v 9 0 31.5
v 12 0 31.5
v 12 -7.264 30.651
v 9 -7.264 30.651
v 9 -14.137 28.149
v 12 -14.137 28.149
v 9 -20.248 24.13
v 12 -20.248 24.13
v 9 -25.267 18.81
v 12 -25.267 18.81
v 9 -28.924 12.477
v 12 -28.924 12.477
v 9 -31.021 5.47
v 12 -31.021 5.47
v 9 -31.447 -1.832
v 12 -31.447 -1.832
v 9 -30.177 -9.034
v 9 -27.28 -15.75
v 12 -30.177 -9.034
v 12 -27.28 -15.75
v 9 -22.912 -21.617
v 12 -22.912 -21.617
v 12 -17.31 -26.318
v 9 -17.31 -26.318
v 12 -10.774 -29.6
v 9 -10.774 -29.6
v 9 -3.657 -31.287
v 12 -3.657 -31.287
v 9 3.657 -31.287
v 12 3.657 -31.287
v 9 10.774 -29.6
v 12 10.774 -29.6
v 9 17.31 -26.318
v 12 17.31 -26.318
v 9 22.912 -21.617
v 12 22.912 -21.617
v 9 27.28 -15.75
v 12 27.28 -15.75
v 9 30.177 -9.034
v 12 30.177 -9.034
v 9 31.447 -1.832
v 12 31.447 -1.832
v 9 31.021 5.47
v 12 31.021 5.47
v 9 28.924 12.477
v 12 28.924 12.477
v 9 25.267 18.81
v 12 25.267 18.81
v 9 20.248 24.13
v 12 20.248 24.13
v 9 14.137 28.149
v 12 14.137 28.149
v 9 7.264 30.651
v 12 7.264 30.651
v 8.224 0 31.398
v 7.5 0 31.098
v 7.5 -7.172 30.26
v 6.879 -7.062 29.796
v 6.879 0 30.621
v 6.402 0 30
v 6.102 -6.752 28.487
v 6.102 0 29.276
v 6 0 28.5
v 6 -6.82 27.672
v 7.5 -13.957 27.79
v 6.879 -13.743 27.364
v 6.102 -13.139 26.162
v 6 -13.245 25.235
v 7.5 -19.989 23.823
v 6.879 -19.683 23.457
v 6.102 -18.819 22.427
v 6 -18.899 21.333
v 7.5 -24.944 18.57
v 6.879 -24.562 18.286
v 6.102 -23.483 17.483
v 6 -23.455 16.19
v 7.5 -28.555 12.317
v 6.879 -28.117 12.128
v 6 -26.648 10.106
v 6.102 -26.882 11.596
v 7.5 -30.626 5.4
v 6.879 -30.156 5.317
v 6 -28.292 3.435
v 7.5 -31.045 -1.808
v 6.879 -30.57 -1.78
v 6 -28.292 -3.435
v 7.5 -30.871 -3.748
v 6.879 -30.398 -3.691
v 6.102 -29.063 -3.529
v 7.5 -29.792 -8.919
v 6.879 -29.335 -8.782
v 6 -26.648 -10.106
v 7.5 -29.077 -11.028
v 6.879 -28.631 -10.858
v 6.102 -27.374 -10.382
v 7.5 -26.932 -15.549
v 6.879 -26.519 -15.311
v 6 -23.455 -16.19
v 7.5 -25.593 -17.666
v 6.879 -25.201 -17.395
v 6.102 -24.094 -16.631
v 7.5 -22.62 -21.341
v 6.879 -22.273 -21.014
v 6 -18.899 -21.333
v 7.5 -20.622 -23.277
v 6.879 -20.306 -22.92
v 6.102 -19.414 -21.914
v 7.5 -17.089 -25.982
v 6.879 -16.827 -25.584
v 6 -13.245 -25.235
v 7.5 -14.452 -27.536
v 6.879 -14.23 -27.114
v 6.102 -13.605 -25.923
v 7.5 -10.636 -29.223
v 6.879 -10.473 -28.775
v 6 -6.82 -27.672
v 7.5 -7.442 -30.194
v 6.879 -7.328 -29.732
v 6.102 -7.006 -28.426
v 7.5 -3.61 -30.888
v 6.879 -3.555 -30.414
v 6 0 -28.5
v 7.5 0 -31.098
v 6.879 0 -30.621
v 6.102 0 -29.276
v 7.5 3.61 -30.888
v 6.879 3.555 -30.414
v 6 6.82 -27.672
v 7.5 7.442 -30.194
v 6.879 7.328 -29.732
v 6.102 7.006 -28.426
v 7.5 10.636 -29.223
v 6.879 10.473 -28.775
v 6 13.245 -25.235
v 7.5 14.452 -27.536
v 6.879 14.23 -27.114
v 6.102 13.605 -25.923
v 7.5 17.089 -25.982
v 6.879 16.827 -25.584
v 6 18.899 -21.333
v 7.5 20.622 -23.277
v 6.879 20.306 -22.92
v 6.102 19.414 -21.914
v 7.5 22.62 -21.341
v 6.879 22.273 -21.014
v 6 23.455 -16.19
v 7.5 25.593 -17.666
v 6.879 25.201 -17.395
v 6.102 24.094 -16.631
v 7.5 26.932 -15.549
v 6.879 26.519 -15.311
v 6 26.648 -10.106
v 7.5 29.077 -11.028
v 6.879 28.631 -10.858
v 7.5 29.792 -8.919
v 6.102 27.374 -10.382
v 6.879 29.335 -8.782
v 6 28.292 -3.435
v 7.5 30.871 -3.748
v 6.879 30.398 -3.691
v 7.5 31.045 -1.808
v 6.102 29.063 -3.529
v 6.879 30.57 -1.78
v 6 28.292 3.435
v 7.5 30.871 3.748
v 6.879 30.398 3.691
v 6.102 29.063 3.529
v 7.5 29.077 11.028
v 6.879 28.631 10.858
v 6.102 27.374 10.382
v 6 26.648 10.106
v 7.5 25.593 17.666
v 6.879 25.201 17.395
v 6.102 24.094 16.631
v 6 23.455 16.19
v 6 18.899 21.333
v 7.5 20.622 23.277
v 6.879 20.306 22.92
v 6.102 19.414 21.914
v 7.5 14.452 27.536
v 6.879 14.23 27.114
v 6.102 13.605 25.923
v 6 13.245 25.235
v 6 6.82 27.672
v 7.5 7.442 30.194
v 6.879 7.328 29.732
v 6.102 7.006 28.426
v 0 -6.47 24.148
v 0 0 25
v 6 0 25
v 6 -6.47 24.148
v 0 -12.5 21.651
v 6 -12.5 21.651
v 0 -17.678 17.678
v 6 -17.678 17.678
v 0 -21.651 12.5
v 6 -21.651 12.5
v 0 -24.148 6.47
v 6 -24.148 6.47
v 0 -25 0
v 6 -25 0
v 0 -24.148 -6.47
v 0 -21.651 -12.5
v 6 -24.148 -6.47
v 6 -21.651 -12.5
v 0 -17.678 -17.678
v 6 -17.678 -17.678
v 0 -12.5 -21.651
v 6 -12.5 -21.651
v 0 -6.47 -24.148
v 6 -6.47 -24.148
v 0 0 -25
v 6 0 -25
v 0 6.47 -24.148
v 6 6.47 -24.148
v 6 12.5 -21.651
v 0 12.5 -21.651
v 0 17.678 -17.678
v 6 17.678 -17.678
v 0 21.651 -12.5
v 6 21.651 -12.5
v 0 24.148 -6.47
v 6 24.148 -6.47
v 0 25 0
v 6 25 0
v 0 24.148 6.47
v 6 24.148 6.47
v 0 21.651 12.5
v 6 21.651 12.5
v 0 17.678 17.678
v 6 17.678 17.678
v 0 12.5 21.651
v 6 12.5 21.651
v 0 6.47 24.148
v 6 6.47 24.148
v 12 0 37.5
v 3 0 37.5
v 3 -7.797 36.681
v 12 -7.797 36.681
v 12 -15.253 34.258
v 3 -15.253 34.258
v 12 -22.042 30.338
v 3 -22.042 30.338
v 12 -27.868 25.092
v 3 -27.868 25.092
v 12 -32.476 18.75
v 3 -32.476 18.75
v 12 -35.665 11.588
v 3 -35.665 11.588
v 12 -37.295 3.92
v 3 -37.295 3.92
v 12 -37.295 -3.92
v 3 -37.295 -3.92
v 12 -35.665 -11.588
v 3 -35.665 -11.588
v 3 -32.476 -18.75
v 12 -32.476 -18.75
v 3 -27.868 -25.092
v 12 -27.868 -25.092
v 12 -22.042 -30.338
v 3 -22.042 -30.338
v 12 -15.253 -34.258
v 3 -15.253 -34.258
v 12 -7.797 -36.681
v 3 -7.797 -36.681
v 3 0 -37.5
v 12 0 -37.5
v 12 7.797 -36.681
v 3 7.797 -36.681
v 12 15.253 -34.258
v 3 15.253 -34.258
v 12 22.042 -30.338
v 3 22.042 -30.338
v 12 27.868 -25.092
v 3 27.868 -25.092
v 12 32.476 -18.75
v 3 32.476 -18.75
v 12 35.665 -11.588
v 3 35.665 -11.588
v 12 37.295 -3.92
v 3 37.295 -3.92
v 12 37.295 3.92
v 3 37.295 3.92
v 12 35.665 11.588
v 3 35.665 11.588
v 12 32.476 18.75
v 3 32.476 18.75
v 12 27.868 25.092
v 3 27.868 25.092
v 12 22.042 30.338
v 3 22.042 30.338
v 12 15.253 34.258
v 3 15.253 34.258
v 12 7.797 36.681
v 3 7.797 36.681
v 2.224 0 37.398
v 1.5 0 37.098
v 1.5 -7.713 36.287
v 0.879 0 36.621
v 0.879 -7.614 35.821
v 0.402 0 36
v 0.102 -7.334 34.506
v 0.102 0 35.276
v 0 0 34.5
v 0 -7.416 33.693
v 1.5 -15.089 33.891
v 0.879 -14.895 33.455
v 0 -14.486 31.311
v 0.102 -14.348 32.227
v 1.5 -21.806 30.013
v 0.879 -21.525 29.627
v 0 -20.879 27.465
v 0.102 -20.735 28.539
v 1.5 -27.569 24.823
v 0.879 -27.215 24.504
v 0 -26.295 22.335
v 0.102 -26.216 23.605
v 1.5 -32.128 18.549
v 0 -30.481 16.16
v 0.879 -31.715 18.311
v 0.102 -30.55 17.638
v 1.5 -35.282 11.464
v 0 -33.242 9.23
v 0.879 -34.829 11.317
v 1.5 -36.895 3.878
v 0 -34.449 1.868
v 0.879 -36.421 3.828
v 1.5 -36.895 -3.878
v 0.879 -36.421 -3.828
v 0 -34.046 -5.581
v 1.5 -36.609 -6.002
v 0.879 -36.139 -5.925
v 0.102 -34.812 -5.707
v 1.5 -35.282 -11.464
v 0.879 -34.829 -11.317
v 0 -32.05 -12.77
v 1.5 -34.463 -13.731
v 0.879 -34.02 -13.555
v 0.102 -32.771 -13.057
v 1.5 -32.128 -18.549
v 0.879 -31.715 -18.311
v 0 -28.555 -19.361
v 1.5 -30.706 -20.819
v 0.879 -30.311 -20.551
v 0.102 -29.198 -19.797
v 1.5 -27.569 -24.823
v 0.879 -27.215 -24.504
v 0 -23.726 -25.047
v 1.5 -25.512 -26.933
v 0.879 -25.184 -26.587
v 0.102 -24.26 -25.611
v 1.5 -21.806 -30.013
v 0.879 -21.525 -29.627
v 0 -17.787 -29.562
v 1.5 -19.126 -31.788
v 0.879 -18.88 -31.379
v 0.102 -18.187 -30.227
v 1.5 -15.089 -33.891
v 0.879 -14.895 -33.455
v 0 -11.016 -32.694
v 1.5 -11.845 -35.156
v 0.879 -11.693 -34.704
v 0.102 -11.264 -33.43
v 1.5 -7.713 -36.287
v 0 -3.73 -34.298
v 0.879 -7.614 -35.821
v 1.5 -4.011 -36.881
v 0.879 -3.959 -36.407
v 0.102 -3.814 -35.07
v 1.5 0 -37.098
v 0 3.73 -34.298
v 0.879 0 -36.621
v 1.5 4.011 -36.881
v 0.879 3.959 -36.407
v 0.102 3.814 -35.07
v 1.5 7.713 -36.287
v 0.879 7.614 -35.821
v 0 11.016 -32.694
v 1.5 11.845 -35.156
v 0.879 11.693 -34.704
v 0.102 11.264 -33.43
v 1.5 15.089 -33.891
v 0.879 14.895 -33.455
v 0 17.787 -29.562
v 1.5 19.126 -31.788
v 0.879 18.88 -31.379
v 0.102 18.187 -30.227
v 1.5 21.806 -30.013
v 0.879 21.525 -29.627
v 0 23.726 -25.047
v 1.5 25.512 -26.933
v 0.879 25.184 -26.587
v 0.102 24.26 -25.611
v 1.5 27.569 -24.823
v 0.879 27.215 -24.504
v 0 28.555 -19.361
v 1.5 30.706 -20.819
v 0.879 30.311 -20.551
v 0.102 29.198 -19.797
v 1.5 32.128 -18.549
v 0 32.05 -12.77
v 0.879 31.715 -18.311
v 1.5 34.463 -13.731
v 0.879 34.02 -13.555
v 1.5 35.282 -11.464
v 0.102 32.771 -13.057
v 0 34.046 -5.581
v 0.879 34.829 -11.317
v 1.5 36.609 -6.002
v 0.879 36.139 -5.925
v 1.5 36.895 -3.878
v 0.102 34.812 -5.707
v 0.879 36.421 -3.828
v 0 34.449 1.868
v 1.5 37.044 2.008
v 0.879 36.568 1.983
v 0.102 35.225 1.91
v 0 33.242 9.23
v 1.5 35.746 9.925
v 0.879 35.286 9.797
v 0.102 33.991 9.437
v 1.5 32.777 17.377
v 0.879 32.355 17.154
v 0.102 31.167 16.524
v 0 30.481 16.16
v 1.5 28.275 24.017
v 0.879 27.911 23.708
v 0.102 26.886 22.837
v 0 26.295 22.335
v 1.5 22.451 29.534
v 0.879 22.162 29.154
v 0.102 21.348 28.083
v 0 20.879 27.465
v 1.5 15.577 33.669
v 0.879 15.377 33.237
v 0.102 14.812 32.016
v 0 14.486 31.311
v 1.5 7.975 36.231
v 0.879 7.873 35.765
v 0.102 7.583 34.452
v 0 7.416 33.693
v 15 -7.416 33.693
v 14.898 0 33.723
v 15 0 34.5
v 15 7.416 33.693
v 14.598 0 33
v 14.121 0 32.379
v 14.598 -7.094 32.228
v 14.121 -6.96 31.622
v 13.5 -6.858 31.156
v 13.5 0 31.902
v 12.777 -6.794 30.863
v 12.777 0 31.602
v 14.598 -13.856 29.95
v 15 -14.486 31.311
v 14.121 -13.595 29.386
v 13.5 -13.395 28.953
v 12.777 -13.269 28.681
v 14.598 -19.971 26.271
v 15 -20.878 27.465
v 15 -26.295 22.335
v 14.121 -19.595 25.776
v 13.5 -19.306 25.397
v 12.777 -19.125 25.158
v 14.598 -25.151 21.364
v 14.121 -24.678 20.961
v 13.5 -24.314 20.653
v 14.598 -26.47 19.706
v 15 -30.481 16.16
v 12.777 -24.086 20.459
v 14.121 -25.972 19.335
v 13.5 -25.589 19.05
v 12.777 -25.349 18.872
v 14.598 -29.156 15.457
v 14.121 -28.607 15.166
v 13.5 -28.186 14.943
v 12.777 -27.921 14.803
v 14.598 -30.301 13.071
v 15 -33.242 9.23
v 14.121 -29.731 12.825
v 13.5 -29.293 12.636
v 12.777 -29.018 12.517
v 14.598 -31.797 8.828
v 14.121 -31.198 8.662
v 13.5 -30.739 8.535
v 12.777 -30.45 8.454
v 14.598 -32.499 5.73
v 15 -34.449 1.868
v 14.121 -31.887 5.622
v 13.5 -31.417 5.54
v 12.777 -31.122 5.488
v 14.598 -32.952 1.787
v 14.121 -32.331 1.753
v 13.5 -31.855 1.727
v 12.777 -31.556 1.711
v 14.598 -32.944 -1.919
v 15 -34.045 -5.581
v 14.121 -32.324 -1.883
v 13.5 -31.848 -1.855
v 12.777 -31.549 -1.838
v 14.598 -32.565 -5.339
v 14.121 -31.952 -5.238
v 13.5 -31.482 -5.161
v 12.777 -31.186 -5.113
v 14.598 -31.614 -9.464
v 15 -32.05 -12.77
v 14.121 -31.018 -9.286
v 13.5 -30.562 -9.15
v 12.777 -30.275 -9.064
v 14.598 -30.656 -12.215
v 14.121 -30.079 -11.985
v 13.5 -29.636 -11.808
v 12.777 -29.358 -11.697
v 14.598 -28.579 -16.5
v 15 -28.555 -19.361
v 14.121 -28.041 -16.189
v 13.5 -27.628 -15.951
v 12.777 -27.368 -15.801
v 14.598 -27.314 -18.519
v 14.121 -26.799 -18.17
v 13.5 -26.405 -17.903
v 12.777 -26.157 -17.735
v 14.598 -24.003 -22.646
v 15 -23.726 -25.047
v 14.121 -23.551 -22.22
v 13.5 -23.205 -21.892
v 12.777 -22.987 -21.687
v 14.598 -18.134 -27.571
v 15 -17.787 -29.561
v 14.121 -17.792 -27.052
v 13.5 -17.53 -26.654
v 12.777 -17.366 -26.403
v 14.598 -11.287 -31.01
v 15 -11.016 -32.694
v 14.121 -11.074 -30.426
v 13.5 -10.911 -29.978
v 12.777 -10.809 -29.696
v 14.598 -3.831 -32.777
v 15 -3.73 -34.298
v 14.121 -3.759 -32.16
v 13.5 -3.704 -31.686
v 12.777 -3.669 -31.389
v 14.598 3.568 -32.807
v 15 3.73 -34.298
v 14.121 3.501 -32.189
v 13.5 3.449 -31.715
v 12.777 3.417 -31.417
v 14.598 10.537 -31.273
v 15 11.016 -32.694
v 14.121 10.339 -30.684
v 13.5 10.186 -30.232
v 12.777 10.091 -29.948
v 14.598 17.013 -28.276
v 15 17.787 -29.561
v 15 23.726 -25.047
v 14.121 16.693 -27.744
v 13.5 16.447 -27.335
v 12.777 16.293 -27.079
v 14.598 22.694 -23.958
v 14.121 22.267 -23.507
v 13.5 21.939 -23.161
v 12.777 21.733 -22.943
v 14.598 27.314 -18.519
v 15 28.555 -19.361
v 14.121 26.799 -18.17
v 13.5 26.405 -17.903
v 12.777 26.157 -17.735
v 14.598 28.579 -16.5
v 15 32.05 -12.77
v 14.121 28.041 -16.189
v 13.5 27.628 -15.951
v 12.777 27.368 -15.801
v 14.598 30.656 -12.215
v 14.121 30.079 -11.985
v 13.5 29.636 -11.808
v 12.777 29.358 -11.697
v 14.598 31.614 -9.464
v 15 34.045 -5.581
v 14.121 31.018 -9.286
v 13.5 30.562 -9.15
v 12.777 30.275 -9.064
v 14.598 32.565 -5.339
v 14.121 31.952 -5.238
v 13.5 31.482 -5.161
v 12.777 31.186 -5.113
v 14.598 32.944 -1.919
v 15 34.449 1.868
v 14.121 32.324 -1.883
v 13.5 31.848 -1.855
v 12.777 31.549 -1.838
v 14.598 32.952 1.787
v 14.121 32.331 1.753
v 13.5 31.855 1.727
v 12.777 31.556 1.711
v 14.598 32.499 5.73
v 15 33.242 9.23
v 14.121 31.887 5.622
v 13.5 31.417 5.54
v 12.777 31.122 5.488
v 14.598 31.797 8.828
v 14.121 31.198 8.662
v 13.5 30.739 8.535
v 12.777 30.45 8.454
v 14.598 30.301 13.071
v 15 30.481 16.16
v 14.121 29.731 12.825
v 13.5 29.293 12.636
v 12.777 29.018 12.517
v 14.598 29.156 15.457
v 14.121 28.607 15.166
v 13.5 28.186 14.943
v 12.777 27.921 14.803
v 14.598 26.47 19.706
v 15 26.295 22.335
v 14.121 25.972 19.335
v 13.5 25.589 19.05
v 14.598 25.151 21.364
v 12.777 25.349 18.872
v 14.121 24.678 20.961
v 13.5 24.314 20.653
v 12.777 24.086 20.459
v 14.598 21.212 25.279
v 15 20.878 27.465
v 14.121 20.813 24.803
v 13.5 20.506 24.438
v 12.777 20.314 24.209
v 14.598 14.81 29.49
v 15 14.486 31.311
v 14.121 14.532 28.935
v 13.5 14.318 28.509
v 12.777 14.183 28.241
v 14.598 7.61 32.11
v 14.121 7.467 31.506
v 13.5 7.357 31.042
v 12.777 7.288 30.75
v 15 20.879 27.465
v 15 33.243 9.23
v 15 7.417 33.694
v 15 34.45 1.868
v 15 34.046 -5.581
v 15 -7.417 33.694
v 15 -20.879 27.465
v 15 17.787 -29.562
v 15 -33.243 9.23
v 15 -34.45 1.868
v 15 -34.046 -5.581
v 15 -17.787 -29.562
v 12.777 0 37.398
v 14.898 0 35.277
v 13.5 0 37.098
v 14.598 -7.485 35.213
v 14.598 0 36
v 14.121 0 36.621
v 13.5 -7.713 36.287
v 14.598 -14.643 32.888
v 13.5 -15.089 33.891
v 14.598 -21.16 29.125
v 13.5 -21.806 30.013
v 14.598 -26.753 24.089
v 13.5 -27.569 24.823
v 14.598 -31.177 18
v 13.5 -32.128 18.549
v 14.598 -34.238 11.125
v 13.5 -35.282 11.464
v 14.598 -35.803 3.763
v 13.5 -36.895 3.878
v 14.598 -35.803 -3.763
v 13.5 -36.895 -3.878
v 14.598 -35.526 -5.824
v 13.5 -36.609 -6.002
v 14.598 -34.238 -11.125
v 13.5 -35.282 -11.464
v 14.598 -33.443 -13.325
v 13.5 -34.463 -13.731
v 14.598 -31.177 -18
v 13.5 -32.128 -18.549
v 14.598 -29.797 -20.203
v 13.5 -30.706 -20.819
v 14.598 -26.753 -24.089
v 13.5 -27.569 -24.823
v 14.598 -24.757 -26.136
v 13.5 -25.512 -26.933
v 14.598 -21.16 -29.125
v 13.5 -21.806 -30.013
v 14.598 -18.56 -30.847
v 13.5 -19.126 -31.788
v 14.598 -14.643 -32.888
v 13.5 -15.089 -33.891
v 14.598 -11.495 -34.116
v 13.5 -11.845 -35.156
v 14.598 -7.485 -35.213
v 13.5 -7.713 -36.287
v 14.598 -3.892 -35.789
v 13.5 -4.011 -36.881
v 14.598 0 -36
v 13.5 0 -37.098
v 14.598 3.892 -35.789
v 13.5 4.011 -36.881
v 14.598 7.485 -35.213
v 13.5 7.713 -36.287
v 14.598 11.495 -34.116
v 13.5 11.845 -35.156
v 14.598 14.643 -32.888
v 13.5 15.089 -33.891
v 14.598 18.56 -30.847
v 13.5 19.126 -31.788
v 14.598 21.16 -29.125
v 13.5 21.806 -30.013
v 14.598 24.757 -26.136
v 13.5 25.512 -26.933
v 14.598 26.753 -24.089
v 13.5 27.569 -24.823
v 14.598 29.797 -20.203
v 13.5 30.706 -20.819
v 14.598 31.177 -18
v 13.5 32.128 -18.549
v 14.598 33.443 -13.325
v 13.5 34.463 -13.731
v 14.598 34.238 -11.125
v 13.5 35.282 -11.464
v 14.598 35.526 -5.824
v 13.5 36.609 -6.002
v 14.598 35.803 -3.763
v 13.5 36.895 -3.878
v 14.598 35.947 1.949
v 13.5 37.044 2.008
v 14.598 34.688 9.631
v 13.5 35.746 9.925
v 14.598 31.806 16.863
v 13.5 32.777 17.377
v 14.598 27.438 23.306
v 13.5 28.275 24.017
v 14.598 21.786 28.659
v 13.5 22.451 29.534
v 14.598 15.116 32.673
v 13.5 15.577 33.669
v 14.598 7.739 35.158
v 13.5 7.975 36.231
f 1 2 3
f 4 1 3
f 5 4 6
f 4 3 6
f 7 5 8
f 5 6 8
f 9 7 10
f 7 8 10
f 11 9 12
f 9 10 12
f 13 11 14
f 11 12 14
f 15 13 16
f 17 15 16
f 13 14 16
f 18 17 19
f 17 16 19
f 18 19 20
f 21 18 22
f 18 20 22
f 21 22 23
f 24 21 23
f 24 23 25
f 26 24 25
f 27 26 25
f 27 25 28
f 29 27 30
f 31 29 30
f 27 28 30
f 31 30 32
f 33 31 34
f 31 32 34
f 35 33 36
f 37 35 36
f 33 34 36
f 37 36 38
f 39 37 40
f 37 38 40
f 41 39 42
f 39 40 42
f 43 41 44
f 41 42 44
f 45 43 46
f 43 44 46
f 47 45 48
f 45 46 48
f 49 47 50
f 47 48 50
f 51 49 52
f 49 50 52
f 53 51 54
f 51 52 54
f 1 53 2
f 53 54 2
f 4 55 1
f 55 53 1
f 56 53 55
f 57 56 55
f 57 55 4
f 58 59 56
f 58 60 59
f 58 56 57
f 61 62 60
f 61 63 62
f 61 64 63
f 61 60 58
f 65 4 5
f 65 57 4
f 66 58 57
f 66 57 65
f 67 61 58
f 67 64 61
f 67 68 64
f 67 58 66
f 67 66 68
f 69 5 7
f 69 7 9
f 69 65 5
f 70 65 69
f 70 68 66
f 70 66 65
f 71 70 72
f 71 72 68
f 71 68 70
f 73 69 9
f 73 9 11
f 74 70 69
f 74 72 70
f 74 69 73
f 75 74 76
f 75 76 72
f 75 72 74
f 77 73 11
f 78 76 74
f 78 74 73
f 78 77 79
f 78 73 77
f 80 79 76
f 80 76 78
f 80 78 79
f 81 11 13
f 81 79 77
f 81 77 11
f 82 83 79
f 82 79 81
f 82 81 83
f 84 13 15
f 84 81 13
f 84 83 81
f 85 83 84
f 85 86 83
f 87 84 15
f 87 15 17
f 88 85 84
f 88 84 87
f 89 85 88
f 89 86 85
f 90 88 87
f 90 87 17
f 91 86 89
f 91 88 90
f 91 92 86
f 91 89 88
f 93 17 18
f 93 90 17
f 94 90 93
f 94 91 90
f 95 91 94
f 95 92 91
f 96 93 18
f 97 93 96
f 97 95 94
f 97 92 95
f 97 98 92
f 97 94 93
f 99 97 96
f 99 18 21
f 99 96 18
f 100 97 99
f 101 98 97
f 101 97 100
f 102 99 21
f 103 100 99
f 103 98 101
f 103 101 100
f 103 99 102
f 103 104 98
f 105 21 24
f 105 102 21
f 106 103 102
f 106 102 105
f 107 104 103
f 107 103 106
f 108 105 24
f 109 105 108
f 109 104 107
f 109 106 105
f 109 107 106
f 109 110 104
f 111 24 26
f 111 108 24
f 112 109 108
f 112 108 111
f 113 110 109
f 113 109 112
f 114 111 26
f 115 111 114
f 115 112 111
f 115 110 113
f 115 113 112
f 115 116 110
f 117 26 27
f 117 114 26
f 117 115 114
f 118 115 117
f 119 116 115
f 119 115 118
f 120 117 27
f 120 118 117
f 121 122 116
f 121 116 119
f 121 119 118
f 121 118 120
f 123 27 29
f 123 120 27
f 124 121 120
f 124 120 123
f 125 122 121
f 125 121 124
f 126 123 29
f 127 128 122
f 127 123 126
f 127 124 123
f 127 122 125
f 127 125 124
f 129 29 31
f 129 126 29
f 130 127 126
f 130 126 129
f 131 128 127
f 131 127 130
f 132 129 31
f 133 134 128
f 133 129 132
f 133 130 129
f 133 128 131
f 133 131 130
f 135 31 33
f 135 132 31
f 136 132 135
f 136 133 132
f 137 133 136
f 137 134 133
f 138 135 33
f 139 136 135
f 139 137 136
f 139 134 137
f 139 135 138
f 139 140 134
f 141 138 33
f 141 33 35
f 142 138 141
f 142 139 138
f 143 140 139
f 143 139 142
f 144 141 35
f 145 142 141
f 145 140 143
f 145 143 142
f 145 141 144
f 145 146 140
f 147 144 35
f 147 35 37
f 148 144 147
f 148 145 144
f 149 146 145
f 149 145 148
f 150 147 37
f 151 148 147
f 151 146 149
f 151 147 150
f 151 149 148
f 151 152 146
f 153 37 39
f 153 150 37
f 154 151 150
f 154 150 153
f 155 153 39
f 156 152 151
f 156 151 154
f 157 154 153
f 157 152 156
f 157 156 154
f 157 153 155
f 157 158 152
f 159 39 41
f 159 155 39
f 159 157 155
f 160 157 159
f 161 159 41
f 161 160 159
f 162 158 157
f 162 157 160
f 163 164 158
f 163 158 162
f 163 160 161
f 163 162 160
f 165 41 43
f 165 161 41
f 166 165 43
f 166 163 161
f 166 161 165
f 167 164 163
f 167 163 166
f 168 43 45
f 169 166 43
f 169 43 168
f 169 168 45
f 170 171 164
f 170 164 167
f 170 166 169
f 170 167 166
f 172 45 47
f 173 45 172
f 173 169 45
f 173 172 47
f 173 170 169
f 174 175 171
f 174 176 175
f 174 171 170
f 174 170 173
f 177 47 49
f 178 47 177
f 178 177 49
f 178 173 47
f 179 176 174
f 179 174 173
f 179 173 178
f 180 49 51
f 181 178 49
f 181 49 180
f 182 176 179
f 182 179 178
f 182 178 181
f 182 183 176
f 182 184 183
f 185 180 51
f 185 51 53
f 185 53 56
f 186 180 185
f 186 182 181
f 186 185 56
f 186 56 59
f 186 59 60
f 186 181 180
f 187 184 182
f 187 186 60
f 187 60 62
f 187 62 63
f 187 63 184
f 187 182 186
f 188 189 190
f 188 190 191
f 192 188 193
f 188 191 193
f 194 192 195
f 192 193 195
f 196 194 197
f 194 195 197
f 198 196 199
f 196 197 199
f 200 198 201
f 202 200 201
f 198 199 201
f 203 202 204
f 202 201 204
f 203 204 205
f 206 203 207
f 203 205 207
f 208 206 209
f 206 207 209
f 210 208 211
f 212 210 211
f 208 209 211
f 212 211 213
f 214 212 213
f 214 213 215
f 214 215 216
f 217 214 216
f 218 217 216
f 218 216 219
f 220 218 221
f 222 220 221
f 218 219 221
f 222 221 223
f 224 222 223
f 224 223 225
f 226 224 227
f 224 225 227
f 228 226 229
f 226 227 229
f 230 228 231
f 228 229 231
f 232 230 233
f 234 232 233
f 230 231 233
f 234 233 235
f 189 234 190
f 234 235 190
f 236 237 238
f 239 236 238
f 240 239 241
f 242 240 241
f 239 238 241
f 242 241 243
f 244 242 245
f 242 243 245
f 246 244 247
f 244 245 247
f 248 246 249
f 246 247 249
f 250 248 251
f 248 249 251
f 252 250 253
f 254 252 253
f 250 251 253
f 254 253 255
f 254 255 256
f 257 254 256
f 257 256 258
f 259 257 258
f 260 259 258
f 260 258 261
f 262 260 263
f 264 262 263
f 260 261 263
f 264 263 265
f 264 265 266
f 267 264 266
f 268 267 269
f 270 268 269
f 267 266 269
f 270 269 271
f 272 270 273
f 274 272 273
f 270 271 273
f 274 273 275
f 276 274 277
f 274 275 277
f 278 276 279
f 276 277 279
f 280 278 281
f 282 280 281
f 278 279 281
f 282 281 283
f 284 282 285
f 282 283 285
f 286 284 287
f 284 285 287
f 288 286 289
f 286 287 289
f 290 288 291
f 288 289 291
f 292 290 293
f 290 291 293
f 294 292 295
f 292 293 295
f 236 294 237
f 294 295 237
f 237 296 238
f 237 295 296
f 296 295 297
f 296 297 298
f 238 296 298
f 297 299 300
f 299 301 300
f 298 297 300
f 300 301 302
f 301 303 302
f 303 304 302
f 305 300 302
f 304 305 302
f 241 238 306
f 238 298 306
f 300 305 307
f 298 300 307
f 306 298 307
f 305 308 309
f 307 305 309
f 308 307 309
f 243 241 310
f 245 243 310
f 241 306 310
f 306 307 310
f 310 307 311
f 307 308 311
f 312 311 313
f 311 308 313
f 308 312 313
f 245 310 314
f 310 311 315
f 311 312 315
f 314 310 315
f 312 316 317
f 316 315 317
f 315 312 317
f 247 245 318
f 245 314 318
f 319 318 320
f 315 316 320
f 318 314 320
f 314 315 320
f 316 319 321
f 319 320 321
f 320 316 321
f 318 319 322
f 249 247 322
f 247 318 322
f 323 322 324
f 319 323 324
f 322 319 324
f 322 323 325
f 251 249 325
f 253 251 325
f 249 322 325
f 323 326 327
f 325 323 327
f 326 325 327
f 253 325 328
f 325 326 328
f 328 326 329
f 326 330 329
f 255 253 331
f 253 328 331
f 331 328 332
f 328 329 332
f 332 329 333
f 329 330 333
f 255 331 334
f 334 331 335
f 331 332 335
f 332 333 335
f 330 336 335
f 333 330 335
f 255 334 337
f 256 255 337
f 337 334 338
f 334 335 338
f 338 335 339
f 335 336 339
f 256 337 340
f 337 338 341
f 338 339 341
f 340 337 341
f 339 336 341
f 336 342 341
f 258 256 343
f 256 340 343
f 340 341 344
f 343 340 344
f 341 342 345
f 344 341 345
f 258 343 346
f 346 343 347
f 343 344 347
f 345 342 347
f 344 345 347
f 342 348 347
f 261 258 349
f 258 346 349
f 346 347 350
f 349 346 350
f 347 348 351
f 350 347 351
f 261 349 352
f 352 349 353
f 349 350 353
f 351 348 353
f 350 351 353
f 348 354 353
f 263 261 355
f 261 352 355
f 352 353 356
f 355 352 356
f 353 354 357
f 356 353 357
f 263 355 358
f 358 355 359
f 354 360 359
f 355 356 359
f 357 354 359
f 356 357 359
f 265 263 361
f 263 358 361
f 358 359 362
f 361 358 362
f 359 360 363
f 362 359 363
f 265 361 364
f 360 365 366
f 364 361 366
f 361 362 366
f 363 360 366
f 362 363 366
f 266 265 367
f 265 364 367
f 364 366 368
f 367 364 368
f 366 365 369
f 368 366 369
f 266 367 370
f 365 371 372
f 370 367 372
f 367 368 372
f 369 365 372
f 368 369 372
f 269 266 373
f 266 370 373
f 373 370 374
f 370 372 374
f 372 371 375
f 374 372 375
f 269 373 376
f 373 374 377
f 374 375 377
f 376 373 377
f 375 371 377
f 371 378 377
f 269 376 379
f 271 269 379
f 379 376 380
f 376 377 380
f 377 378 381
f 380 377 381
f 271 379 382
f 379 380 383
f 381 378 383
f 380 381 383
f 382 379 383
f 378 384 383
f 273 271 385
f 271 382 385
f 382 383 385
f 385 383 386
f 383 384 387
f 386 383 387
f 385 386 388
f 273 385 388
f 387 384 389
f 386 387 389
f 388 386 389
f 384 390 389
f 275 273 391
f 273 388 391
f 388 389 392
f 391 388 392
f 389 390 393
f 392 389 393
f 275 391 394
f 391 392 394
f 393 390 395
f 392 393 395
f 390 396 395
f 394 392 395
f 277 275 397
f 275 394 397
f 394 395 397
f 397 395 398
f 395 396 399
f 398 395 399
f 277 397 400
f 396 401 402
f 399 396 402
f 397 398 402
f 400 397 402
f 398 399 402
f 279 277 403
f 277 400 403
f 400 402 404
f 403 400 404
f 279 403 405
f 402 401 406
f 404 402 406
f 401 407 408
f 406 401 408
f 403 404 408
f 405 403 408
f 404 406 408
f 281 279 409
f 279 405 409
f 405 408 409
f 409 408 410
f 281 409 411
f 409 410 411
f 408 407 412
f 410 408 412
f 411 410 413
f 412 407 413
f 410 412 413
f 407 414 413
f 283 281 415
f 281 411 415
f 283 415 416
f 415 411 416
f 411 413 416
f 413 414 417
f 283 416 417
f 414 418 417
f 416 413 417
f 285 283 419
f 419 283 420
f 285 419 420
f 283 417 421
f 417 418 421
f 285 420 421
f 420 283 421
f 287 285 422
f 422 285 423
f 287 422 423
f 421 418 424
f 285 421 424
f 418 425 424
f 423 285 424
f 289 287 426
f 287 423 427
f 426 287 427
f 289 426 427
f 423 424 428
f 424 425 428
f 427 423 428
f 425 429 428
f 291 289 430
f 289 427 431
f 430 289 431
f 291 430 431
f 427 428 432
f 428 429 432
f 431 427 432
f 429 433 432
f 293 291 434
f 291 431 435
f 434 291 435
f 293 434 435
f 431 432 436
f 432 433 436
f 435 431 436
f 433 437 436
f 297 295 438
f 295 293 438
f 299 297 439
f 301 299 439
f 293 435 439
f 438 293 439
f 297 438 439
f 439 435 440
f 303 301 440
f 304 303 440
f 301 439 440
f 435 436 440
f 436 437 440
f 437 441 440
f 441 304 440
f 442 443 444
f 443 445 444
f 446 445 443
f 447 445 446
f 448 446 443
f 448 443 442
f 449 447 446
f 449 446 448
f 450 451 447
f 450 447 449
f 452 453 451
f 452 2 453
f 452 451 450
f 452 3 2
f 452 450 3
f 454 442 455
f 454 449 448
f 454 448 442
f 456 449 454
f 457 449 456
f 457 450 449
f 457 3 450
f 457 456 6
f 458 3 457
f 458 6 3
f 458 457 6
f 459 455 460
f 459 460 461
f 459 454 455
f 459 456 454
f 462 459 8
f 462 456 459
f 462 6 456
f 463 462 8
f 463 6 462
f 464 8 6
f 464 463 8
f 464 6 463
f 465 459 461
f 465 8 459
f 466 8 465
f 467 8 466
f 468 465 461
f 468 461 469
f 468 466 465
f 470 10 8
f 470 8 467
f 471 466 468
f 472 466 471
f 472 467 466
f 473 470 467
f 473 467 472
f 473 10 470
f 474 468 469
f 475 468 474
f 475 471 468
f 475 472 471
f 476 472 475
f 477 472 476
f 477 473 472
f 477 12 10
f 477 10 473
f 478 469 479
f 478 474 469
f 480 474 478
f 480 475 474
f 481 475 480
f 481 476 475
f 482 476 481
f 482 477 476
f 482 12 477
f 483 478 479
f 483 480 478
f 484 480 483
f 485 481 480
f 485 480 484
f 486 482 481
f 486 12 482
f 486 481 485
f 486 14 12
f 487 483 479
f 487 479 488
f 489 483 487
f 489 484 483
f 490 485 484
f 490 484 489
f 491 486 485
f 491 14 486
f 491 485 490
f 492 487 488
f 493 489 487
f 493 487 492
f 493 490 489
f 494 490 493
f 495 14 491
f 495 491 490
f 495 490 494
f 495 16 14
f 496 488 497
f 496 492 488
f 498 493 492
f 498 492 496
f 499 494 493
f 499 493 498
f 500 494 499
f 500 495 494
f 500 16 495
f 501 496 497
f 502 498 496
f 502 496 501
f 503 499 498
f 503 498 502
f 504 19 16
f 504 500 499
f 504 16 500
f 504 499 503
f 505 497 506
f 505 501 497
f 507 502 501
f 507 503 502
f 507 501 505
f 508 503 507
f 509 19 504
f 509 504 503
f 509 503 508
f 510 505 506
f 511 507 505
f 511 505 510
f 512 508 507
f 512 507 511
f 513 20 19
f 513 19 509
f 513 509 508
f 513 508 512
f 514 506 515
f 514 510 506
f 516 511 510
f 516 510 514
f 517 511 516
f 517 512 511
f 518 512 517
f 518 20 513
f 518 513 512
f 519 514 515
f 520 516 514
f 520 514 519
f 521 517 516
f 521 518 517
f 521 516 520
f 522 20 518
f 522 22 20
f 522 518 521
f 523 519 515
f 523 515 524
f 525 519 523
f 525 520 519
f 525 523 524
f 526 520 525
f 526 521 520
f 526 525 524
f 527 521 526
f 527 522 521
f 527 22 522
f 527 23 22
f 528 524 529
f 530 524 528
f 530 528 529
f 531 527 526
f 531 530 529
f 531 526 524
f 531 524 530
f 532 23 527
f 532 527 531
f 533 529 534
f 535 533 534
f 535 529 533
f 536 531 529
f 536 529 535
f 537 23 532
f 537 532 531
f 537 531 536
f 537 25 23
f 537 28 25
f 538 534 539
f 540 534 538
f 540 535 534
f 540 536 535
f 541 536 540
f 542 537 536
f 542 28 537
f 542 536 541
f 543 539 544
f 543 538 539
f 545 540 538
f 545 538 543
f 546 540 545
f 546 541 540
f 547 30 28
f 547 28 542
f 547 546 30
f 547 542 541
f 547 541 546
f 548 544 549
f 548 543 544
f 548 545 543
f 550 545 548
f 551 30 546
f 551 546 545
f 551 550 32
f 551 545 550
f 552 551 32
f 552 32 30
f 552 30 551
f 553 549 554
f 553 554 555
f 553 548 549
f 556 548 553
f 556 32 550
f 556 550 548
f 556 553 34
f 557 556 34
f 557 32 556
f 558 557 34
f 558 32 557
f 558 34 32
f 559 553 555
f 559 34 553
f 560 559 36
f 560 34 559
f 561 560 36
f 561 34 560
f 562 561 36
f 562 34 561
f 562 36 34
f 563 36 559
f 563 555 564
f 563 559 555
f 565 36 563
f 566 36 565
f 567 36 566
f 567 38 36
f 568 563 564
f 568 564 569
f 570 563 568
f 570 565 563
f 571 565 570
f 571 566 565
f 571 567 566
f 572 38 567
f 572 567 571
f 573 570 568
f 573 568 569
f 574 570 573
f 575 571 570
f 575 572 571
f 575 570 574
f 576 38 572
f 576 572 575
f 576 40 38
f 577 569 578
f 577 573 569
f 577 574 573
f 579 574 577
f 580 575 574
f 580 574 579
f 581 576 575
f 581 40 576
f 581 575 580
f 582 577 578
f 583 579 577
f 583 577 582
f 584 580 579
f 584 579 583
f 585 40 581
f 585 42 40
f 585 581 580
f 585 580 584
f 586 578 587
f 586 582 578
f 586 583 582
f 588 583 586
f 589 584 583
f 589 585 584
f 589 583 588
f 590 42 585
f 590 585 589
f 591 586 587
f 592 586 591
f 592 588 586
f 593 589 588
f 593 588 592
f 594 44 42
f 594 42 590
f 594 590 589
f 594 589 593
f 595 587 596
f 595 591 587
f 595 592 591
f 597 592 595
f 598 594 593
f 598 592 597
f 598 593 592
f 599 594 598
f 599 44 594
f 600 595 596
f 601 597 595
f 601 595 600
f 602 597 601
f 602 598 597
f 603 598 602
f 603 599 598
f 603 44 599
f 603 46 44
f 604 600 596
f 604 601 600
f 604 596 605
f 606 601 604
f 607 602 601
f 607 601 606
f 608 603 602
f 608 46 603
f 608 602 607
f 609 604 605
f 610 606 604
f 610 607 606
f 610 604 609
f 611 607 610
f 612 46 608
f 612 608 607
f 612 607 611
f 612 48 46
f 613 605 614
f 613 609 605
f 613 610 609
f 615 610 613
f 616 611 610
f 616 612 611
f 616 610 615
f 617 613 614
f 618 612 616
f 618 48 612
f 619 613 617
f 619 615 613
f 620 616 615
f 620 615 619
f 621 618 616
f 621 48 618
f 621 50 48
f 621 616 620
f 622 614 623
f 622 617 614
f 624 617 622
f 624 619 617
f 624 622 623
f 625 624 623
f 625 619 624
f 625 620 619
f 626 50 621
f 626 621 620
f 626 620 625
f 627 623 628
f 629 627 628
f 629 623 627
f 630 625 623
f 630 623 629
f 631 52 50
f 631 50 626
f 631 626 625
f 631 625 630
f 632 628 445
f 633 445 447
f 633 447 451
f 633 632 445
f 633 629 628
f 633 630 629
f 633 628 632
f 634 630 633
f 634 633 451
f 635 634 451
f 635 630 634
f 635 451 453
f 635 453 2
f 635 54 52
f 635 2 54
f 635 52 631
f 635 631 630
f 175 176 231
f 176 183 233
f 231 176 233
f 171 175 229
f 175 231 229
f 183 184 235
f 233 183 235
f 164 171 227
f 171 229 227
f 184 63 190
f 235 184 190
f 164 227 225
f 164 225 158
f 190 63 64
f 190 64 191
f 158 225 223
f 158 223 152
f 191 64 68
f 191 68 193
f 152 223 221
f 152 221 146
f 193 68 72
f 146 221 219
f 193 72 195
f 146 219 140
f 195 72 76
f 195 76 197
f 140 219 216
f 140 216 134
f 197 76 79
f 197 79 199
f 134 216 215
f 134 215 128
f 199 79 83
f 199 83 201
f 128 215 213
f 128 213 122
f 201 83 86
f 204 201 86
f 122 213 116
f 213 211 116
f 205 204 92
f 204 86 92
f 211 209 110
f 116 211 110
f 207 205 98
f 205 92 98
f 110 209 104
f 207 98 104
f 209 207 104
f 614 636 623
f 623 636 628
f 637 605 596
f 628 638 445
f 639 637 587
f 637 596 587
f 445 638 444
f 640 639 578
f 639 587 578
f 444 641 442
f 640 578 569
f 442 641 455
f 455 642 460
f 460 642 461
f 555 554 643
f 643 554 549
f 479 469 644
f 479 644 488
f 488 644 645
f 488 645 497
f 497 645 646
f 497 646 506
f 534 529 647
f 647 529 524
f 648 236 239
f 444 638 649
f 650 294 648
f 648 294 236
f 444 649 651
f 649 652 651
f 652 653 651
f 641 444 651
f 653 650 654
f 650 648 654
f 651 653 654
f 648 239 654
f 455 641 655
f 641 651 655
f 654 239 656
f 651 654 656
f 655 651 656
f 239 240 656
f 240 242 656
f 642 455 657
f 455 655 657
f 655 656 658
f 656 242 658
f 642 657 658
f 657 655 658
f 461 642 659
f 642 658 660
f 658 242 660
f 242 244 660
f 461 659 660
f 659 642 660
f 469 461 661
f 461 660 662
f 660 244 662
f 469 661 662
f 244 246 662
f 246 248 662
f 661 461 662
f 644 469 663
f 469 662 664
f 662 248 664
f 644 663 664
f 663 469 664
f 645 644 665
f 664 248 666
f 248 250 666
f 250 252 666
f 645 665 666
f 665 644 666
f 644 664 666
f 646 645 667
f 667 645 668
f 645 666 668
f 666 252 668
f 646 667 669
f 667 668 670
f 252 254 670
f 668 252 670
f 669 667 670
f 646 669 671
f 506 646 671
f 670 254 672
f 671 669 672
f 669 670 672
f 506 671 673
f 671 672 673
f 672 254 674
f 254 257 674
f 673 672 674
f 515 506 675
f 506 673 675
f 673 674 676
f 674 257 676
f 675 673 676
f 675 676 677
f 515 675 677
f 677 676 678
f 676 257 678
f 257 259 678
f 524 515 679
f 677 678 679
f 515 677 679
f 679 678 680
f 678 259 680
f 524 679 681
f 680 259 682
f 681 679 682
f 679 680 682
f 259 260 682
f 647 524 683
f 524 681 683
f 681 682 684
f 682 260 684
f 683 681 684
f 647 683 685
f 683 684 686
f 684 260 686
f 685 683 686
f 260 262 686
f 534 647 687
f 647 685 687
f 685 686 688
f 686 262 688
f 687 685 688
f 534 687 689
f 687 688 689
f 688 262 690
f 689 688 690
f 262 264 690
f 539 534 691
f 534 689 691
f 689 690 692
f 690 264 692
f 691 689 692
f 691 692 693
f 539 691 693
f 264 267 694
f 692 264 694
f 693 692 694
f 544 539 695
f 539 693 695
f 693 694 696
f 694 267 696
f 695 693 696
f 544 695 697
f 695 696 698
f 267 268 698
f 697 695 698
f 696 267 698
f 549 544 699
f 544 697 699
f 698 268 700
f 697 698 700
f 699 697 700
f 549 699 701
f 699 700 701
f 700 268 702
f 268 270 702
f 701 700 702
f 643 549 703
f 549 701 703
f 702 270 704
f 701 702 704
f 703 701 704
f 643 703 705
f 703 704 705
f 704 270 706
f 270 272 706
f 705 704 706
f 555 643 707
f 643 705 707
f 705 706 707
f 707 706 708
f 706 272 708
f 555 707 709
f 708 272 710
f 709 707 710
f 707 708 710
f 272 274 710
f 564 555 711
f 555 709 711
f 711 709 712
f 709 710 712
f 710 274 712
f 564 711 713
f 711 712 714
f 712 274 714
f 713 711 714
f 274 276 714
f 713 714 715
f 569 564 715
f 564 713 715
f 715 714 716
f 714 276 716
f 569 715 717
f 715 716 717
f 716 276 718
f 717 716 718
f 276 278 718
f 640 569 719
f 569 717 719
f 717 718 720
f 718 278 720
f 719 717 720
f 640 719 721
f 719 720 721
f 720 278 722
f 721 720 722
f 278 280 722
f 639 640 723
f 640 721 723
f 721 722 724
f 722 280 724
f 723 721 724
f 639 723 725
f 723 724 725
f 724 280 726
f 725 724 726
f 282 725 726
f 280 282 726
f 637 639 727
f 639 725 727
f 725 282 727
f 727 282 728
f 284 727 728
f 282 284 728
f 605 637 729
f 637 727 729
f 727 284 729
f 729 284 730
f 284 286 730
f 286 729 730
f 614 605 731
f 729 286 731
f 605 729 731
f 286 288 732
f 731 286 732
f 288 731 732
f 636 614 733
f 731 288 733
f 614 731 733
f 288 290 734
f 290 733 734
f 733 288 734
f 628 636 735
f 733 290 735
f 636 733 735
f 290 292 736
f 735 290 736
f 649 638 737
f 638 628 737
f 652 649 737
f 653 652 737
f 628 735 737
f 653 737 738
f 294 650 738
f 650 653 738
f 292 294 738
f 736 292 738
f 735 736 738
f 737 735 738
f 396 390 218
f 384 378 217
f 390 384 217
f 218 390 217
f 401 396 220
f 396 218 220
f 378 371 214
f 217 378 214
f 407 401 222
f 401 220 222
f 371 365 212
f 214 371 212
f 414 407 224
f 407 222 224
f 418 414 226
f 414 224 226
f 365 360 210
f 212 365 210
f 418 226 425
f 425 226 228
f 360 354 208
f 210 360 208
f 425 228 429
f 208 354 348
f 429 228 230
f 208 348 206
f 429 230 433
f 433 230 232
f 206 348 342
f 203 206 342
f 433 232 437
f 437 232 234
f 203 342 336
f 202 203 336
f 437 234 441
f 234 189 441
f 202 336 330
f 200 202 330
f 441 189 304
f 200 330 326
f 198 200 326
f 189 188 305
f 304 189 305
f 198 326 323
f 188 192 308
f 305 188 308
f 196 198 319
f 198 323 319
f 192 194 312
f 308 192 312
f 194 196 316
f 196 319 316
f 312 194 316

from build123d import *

# Parameters (mm, degrees)
FILLET1_R = 3
FILLET2_R = 3


with BuildPart() as part:
    # Sketch1 → Revolve1 (revolve)
    with BuildSketch(Plane.XY, mode=Mode.PRIVATE) as revolve1_sk:
        Polygon((15, 31.5), (15, 37.5), (0, 37.5), (0, 25), (6, 25), (6, 31.5), align=None)
    revolve(revolve1_sk.sketch.rotate(Axis((0, 0, 0), (1, 0, 0)), 90), axis=Axis((0, 0, 0), (1, 0, 0)))

    # Fillet1
    fillet1_edges = [part.edges().sort_by_distance(p)[0] for p in [
        (15, 0, -37.5),
        (15, 0, -31.5),
    ]]
    fillet(fillet1_edges, radius=FILLET1_R - 0.0001)  # a hair under: the kernel refuses the full size

    # Fillet2
    fillet2_edges = [part.edges().sort_by_distance(p)[0] for p in [
        (6, 0, -31.5),
        (0, 0, -37.5),
    ]]
    fillet(fillet2_edges, radius=FILLET2_R)


solid = part.part
